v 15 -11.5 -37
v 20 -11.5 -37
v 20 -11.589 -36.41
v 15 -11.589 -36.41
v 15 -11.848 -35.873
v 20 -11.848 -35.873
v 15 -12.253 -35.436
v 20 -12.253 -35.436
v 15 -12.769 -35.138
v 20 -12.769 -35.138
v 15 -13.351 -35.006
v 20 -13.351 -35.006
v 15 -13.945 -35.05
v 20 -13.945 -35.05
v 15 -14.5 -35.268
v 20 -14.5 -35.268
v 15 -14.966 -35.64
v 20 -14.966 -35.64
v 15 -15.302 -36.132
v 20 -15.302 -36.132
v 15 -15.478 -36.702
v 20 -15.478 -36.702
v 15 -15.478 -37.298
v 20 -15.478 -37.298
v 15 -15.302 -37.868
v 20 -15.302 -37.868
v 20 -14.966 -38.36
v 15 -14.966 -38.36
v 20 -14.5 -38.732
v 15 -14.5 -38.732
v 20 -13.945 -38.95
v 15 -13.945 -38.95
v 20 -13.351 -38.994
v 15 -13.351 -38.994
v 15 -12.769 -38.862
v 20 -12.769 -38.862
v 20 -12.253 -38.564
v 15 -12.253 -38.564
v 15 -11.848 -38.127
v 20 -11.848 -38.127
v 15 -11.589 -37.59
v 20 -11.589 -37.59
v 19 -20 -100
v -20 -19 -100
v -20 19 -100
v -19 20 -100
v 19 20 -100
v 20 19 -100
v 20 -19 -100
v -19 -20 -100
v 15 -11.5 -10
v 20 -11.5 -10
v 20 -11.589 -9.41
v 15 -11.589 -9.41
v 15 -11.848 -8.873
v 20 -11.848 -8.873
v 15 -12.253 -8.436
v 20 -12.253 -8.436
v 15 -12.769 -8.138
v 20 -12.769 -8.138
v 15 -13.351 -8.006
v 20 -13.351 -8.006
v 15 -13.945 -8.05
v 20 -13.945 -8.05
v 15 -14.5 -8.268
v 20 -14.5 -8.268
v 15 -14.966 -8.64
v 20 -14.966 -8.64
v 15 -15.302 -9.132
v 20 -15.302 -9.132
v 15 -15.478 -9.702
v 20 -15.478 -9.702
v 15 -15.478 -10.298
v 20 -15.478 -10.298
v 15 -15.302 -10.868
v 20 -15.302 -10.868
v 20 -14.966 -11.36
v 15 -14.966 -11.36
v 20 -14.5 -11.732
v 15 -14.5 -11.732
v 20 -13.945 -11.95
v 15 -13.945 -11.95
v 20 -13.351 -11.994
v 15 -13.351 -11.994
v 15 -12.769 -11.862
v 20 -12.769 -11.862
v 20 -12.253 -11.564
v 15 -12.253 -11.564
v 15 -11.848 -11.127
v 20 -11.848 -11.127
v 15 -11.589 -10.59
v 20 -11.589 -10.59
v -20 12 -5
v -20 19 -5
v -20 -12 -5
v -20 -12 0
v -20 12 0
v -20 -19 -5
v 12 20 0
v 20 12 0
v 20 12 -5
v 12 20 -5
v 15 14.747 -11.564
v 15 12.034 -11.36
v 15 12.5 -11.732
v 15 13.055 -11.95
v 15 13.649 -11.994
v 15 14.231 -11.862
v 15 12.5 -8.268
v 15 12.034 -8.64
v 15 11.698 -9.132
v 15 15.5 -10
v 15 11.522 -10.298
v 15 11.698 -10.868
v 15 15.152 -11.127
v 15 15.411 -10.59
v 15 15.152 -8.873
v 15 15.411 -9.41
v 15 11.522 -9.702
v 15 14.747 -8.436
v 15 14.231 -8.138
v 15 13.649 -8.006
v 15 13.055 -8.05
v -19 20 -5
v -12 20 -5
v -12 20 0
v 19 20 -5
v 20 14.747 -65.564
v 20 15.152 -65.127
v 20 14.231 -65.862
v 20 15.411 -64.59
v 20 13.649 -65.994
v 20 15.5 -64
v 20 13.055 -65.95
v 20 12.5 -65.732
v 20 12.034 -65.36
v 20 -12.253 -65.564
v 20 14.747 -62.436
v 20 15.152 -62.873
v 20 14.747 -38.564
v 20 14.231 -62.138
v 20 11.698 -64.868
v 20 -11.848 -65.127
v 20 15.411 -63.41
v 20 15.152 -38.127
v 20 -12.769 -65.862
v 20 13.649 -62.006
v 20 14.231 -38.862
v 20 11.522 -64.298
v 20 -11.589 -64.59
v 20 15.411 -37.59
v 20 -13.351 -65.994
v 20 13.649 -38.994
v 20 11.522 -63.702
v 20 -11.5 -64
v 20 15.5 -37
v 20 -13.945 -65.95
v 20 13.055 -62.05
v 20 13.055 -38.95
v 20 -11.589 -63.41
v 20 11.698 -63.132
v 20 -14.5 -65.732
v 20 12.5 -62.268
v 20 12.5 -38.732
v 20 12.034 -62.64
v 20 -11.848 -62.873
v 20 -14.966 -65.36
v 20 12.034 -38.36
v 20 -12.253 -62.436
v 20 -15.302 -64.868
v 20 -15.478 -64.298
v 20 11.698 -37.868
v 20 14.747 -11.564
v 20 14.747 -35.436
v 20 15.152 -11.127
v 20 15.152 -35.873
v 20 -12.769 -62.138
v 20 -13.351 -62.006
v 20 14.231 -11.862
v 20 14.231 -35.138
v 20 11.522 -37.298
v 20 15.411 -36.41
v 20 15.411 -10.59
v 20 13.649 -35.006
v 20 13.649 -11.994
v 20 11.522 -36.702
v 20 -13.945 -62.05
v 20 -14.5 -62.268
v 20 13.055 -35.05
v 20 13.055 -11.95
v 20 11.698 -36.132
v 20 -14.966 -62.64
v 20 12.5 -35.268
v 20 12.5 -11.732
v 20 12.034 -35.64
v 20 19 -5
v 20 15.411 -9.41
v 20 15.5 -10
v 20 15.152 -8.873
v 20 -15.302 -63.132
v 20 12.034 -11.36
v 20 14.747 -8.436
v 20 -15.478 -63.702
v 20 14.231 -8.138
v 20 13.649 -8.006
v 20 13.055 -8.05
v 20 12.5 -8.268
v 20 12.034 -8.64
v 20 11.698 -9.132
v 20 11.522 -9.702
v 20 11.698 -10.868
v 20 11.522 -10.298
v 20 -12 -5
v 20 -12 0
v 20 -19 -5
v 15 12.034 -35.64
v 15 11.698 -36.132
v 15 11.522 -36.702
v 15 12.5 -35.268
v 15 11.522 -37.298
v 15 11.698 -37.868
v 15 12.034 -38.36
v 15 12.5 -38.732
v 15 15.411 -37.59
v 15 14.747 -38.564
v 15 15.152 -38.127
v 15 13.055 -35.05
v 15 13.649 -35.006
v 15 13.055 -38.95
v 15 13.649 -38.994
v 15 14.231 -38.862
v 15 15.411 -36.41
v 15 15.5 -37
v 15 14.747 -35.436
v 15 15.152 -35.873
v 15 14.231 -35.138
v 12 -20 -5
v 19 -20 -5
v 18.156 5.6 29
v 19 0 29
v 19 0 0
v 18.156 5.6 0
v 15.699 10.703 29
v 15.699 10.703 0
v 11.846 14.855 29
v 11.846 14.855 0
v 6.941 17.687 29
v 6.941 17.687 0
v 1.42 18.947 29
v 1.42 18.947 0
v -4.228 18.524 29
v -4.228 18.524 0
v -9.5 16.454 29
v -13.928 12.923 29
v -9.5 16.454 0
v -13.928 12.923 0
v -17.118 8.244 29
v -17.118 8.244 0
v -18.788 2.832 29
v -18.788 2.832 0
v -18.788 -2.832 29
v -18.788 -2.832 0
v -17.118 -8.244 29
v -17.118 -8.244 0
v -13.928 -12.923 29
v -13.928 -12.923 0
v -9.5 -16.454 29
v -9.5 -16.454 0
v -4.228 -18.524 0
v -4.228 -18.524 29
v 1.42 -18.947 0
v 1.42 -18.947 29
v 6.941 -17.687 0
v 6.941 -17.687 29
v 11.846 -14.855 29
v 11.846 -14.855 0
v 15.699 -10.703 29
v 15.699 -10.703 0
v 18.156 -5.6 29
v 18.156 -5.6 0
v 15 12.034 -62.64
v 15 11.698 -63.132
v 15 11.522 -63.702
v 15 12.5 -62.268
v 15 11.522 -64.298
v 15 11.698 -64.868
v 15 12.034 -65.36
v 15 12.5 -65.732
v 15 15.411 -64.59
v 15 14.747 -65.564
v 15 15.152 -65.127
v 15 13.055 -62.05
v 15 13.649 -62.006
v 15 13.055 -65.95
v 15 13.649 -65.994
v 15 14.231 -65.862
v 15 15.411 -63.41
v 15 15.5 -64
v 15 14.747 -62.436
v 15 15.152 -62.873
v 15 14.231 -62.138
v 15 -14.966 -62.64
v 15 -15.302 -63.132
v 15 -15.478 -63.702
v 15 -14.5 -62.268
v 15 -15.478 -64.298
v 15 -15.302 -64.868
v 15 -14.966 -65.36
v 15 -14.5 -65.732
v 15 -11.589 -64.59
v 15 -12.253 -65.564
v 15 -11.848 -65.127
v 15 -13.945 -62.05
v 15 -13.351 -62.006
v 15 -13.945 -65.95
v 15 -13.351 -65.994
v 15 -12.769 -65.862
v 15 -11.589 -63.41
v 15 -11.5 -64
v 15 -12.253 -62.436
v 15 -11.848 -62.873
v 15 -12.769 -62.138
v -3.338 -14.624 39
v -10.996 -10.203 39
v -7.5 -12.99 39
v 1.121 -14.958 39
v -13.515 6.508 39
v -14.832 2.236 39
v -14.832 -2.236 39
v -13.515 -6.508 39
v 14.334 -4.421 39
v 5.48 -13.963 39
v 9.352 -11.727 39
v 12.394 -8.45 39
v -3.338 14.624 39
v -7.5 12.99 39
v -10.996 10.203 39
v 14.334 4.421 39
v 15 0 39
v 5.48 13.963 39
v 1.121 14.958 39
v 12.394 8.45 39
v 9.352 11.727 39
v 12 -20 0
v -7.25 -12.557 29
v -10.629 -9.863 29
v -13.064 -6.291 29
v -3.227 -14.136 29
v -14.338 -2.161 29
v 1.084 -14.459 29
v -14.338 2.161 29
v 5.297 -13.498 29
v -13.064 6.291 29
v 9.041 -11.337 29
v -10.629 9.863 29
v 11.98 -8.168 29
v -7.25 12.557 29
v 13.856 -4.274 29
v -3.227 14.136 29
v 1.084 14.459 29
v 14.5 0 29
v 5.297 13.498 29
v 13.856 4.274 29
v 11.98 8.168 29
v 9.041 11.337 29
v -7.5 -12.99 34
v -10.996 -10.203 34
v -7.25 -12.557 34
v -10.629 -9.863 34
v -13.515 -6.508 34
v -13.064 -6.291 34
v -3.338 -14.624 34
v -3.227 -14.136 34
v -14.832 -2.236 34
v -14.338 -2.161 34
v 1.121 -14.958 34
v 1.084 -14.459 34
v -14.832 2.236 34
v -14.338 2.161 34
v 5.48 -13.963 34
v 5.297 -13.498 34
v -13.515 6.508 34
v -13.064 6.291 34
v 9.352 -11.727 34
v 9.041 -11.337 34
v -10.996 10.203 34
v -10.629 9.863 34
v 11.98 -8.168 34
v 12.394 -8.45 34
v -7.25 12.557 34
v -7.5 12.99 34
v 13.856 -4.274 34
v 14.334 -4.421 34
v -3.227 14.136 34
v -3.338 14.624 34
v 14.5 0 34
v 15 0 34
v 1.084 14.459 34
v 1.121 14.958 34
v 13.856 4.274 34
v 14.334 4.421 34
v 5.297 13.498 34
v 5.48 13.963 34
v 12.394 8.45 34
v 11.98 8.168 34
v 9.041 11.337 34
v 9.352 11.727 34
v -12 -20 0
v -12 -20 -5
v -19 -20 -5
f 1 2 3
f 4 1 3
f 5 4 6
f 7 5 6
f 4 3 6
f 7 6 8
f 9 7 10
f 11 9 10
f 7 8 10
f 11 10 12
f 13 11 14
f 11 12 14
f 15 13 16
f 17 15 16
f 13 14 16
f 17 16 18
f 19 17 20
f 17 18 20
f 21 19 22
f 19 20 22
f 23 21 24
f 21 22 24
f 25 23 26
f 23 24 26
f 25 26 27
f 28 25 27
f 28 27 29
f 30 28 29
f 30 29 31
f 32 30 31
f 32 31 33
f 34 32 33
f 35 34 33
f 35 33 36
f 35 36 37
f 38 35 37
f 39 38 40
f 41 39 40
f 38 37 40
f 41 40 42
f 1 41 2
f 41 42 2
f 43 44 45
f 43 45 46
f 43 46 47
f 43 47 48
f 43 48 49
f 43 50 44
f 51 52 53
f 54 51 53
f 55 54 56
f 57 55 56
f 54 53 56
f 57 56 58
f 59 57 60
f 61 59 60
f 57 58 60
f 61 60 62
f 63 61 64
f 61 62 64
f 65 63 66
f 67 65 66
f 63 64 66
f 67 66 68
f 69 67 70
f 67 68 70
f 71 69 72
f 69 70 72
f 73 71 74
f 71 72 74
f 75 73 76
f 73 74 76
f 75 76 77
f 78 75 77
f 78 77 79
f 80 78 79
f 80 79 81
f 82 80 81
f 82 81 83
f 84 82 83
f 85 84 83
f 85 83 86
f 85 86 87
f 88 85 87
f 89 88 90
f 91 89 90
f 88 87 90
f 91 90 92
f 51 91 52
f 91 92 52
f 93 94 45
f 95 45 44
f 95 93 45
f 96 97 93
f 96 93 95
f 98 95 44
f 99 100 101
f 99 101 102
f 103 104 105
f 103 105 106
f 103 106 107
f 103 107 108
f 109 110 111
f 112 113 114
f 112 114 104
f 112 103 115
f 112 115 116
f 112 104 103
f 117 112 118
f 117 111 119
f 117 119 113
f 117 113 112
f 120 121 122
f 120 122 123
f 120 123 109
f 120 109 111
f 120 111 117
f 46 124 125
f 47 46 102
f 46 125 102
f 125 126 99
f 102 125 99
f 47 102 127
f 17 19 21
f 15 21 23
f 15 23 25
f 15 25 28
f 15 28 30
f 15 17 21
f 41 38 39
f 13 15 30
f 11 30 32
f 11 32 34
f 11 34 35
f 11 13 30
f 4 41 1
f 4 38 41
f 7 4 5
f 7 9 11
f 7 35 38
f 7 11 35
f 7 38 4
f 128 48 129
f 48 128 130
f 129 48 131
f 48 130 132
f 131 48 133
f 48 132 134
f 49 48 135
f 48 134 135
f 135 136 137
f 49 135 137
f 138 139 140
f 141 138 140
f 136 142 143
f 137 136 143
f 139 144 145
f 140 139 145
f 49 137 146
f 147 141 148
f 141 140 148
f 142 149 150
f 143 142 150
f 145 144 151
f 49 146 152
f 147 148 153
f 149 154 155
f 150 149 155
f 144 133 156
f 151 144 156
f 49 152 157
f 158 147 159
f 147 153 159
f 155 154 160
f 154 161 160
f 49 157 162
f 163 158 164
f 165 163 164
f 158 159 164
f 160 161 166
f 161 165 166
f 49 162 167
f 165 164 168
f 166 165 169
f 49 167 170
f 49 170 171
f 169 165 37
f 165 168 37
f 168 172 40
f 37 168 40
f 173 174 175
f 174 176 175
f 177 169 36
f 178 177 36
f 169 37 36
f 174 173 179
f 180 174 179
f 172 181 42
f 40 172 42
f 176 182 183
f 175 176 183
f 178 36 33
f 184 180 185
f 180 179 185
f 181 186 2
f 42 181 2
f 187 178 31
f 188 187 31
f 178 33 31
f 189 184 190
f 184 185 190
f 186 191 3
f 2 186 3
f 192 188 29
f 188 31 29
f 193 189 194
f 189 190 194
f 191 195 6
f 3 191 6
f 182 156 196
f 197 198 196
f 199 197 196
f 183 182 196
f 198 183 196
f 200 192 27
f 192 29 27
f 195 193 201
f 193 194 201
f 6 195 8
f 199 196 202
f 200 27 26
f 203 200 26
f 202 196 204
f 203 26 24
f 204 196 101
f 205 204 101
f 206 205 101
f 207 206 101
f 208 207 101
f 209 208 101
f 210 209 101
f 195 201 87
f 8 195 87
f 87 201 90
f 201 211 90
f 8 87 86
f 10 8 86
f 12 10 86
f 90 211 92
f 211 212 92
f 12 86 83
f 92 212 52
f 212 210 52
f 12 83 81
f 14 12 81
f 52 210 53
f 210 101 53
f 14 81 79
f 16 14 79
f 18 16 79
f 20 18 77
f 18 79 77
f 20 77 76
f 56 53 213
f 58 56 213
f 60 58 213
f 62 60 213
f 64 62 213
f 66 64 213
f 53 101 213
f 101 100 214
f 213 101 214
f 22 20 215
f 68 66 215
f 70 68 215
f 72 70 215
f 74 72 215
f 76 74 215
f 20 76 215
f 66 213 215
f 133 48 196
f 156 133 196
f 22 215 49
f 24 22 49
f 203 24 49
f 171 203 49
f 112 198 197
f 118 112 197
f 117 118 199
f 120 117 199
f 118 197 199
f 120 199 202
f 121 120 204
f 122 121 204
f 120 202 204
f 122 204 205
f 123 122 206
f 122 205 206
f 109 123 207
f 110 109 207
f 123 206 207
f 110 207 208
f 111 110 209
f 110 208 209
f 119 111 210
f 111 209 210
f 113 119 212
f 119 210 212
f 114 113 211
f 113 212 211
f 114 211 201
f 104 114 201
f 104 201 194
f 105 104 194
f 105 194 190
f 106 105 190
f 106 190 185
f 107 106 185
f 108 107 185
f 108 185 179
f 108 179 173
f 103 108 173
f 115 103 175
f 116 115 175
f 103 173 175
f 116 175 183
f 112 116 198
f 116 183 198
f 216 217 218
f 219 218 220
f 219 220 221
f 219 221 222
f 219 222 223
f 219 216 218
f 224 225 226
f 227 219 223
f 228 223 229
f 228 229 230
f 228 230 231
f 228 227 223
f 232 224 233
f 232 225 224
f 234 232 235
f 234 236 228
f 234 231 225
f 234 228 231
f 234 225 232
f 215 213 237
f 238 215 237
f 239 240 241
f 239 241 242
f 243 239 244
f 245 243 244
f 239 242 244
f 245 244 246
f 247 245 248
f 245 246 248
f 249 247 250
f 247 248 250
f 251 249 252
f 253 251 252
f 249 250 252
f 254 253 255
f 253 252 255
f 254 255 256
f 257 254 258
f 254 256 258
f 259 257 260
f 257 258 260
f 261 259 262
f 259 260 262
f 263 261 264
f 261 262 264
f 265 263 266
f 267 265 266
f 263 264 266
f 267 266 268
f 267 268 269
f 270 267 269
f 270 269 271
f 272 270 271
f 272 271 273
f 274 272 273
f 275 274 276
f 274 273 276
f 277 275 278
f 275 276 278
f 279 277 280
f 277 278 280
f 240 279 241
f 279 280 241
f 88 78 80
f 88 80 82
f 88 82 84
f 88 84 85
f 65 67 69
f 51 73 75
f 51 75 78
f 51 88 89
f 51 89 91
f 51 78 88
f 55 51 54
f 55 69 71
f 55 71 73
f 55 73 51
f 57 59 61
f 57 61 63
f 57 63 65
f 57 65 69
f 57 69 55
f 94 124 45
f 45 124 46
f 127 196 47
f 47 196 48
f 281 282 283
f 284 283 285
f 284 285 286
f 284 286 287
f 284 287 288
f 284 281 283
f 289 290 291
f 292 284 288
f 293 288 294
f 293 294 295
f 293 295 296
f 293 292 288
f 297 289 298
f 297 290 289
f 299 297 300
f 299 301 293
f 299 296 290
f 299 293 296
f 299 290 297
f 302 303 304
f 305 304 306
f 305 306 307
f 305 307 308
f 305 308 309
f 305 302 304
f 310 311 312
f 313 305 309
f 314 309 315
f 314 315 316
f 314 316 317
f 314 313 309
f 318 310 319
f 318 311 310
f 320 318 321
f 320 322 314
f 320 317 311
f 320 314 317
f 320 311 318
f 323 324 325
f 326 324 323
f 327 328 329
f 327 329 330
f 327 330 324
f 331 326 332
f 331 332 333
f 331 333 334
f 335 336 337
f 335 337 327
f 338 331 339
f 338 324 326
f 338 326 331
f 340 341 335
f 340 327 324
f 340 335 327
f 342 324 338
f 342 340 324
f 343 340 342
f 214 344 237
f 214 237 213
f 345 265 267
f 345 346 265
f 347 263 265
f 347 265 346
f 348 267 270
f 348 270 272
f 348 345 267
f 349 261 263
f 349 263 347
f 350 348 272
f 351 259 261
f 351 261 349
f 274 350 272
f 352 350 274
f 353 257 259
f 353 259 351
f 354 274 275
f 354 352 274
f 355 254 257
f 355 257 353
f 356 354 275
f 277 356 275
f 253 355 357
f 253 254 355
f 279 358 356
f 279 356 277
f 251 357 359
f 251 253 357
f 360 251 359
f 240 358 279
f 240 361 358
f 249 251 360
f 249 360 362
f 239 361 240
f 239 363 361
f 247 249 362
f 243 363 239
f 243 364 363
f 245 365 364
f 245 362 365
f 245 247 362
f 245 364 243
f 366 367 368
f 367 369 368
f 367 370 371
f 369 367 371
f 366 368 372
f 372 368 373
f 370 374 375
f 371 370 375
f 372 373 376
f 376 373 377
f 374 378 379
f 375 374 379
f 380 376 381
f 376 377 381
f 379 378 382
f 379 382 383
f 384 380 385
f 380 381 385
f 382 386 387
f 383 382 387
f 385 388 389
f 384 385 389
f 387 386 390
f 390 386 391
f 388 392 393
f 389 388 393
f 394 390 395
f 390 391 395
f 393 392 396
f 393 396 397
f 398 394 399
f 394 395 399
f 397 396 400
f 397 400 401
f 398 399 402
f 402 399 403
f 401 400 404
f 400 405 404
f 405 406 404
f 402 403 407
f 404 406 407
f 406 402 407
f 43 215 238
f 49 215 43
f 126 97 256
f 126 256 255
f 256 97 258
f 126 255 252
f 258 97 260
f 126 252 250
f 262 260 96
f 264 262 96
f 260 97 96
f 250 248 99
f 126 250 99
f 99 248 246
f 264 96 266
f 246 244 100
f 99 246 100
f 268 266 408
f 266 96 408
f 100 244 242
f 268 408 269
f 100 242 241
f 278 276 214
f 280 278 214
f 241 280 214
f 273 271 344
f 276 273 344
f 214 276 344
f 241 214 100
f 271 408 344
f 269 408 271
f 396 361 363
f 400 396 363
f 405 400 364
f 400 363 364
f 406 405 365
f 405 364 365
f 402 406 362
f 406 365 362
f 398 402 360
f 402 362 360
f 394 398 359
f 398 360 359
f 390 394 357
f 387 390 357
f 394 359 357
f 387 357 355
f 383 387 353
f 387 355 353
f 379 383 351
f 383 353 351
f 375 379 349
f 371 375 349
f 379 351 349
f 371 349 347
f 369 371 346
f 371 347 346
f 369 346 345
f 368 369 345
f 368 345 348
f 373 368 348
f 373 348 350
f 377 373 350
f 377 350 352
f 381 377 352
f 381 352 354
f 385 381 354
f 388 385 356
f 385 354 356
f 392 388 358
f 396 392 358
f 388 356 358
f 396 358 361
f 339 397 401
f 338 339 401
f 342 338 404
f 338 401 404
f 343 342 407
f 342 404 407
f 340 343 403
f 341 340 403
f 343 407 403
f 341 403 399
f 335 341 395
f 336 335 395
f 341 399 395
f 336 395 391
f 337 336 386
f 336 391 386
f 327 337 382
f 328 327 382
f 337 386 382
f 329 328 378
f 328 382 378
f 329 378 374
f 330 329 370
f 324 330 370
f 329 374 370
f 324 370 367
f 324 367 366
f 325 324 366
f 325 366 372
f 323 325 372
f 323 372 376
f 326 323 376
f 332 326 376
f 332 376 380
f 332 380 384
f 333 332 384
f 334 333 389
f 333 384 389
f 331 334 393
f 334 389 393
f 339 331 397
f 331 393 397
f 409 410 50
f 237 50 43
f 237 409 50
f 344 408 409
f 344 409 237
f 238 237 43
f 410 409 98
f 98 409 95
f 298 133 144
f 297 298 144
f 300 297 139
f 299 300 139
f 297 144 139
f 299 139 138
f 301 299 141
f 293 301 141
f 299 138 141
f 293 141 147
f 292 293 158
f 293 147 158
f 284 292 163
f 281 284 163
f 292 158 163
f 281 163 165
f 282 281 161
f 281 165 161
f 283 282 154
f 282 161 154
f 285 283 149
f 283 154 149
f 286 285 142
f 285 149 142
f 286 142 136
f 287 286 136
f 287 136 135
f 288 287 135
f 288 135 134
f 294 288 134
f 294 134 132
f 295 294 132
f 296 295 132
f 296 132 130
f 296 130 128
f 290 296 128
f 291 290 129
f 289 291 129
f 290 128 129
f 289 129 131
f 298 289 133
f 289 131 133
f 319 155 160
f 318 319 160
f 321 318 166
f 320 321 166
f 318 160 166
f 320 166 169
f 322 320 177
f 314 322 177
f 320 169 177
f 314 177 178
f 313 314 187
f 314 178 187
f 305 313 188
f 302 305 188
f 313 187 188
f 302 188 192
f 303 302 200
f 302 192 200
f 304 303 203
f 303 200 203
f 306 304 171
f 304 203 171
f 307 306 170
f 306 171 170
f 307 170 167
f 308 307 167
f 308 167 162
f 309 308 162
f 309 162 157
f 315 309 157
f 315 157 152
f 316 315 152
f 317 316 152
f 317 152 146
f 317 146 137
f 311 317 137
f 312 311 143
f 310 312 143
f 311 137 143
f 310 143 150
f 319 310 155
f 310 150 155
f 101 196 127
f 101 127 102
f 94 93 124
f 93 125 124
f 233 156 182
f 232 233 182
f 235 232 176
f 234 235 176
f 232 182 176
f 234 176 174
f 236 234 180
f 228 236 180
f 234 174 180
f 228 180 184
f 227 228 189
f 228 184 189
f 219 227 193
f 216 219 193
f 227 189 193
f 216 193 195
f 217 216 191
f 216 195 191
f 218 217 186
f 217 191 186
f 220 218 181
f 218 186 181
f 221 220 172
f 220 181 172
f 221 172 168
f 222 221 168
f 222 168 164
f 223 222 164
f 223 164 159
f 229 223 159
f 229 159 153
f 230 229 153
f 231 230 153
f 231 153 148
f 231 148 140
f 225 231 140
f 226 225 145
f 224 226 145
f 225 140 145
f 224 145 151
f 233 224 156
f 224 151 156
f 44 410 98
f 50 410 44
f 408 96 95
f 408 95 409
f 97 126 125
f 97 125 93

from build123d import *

# Parameters (mm, degrees)
SKETCH_R        = 19
PAD_DEPTH       = 29
SKETCH001_W     = 40
SKETCH001_H     = 40
PAD001_DEPTH    = 100
POCKET_DEPTH    = 5
CHAMFER_SIZE    = 1
SKETCH003_R     = 14.5
PAD002_DEPTH    = 5
SKETCH016_R     = 15
PAD010_DEPTH    = 5
SKETCH014_R     = 2
POCKET001_DEPTH = 5


with BuildPart() as part:
    # Sketch → Pad (new body)
    with BuildSketch(Plane.XY):
        Circle(SKETCH_R)
    extrude(amount=PAD_DEPTH)

    # Sketch001 (on Face2 of Pad) → Pad001 (join)
    with BuildSketch(Plane(origin=(0, 0, 0), x_dir=(1, 0, 0), z_dir=(0, 0, -1))):
        Rectangle(SKETCH001_W, SKETCH001_H)
    extrude(amount=PAD001_DEPTH)

    # Sketch002 (on Face4 of Pad001) → Pocket (cut)
    with BuildSketch(Plane.XY):
        Polygon((-20, 12), (-20, 20), (-12, 20), align=None)
        Polygon((12, 20), (20, 20), (20, 12), align=None)
        Polygon((20, -12), (20, -20), (12, -20), align=None)
        Polygon((-12, -20), (-20, -20), (-20, -12), align=None)
    extrude(amount=-POCKET_DEPTH, mode=Mode.SUBTRACT)

    # Chamfer
    chamfer_edges = [part.edges().sort_by_distance(p)[0] for p in [
        (-20, -20, -52.5),
        (20, -20, -52.5),
        (20, 20, -52.5),
        (-20, 20, -52.5),
    ]]
    chamfer(chamfer_edges, length=CHAMFER_SIZE)

    # Sketch003 (on Face20 of Chamfer) → Pad002 (join)
    with BuildSketch(Plane.XY.offset(29)):
        Circle(SKETCH003_R)
    extrude(amount=PAD002_DEPTH)

    # Sketch016 (on Face22 of Pad002) → Pad010 (join)
    with BuildSketch(Plane.XY.offset(34)):
        Circle(SKETCH016_R)
    extrude(amount=PAD010_DEPTH)

    # Sketch014 (on Face11 of Chamfer) → Pocket001 (cut)
    with BuildSketch(Plane.YZ.offset(20)):
        with Locations((-13.5, -10)):
            Circle(SKETCH014_R)
        with Locations((13.5, -10)):
            Circle(SKETCH014_R)
        with Locations((13.5, -37)):
            Circle(SKETCH014_R)
        with Locations((-13.5, -37)):
            Circle(SKETCH014_R)
        with Locations((13.5, -64)):
            Circle(SKETCH014_R)
        with Locations((-13.5, -64)):
            Circle(SKETCH014_R)
    extrude(amount=-POCKET001_DEPTH, mode=Mode.SUBTRACT)


solid = part.part
